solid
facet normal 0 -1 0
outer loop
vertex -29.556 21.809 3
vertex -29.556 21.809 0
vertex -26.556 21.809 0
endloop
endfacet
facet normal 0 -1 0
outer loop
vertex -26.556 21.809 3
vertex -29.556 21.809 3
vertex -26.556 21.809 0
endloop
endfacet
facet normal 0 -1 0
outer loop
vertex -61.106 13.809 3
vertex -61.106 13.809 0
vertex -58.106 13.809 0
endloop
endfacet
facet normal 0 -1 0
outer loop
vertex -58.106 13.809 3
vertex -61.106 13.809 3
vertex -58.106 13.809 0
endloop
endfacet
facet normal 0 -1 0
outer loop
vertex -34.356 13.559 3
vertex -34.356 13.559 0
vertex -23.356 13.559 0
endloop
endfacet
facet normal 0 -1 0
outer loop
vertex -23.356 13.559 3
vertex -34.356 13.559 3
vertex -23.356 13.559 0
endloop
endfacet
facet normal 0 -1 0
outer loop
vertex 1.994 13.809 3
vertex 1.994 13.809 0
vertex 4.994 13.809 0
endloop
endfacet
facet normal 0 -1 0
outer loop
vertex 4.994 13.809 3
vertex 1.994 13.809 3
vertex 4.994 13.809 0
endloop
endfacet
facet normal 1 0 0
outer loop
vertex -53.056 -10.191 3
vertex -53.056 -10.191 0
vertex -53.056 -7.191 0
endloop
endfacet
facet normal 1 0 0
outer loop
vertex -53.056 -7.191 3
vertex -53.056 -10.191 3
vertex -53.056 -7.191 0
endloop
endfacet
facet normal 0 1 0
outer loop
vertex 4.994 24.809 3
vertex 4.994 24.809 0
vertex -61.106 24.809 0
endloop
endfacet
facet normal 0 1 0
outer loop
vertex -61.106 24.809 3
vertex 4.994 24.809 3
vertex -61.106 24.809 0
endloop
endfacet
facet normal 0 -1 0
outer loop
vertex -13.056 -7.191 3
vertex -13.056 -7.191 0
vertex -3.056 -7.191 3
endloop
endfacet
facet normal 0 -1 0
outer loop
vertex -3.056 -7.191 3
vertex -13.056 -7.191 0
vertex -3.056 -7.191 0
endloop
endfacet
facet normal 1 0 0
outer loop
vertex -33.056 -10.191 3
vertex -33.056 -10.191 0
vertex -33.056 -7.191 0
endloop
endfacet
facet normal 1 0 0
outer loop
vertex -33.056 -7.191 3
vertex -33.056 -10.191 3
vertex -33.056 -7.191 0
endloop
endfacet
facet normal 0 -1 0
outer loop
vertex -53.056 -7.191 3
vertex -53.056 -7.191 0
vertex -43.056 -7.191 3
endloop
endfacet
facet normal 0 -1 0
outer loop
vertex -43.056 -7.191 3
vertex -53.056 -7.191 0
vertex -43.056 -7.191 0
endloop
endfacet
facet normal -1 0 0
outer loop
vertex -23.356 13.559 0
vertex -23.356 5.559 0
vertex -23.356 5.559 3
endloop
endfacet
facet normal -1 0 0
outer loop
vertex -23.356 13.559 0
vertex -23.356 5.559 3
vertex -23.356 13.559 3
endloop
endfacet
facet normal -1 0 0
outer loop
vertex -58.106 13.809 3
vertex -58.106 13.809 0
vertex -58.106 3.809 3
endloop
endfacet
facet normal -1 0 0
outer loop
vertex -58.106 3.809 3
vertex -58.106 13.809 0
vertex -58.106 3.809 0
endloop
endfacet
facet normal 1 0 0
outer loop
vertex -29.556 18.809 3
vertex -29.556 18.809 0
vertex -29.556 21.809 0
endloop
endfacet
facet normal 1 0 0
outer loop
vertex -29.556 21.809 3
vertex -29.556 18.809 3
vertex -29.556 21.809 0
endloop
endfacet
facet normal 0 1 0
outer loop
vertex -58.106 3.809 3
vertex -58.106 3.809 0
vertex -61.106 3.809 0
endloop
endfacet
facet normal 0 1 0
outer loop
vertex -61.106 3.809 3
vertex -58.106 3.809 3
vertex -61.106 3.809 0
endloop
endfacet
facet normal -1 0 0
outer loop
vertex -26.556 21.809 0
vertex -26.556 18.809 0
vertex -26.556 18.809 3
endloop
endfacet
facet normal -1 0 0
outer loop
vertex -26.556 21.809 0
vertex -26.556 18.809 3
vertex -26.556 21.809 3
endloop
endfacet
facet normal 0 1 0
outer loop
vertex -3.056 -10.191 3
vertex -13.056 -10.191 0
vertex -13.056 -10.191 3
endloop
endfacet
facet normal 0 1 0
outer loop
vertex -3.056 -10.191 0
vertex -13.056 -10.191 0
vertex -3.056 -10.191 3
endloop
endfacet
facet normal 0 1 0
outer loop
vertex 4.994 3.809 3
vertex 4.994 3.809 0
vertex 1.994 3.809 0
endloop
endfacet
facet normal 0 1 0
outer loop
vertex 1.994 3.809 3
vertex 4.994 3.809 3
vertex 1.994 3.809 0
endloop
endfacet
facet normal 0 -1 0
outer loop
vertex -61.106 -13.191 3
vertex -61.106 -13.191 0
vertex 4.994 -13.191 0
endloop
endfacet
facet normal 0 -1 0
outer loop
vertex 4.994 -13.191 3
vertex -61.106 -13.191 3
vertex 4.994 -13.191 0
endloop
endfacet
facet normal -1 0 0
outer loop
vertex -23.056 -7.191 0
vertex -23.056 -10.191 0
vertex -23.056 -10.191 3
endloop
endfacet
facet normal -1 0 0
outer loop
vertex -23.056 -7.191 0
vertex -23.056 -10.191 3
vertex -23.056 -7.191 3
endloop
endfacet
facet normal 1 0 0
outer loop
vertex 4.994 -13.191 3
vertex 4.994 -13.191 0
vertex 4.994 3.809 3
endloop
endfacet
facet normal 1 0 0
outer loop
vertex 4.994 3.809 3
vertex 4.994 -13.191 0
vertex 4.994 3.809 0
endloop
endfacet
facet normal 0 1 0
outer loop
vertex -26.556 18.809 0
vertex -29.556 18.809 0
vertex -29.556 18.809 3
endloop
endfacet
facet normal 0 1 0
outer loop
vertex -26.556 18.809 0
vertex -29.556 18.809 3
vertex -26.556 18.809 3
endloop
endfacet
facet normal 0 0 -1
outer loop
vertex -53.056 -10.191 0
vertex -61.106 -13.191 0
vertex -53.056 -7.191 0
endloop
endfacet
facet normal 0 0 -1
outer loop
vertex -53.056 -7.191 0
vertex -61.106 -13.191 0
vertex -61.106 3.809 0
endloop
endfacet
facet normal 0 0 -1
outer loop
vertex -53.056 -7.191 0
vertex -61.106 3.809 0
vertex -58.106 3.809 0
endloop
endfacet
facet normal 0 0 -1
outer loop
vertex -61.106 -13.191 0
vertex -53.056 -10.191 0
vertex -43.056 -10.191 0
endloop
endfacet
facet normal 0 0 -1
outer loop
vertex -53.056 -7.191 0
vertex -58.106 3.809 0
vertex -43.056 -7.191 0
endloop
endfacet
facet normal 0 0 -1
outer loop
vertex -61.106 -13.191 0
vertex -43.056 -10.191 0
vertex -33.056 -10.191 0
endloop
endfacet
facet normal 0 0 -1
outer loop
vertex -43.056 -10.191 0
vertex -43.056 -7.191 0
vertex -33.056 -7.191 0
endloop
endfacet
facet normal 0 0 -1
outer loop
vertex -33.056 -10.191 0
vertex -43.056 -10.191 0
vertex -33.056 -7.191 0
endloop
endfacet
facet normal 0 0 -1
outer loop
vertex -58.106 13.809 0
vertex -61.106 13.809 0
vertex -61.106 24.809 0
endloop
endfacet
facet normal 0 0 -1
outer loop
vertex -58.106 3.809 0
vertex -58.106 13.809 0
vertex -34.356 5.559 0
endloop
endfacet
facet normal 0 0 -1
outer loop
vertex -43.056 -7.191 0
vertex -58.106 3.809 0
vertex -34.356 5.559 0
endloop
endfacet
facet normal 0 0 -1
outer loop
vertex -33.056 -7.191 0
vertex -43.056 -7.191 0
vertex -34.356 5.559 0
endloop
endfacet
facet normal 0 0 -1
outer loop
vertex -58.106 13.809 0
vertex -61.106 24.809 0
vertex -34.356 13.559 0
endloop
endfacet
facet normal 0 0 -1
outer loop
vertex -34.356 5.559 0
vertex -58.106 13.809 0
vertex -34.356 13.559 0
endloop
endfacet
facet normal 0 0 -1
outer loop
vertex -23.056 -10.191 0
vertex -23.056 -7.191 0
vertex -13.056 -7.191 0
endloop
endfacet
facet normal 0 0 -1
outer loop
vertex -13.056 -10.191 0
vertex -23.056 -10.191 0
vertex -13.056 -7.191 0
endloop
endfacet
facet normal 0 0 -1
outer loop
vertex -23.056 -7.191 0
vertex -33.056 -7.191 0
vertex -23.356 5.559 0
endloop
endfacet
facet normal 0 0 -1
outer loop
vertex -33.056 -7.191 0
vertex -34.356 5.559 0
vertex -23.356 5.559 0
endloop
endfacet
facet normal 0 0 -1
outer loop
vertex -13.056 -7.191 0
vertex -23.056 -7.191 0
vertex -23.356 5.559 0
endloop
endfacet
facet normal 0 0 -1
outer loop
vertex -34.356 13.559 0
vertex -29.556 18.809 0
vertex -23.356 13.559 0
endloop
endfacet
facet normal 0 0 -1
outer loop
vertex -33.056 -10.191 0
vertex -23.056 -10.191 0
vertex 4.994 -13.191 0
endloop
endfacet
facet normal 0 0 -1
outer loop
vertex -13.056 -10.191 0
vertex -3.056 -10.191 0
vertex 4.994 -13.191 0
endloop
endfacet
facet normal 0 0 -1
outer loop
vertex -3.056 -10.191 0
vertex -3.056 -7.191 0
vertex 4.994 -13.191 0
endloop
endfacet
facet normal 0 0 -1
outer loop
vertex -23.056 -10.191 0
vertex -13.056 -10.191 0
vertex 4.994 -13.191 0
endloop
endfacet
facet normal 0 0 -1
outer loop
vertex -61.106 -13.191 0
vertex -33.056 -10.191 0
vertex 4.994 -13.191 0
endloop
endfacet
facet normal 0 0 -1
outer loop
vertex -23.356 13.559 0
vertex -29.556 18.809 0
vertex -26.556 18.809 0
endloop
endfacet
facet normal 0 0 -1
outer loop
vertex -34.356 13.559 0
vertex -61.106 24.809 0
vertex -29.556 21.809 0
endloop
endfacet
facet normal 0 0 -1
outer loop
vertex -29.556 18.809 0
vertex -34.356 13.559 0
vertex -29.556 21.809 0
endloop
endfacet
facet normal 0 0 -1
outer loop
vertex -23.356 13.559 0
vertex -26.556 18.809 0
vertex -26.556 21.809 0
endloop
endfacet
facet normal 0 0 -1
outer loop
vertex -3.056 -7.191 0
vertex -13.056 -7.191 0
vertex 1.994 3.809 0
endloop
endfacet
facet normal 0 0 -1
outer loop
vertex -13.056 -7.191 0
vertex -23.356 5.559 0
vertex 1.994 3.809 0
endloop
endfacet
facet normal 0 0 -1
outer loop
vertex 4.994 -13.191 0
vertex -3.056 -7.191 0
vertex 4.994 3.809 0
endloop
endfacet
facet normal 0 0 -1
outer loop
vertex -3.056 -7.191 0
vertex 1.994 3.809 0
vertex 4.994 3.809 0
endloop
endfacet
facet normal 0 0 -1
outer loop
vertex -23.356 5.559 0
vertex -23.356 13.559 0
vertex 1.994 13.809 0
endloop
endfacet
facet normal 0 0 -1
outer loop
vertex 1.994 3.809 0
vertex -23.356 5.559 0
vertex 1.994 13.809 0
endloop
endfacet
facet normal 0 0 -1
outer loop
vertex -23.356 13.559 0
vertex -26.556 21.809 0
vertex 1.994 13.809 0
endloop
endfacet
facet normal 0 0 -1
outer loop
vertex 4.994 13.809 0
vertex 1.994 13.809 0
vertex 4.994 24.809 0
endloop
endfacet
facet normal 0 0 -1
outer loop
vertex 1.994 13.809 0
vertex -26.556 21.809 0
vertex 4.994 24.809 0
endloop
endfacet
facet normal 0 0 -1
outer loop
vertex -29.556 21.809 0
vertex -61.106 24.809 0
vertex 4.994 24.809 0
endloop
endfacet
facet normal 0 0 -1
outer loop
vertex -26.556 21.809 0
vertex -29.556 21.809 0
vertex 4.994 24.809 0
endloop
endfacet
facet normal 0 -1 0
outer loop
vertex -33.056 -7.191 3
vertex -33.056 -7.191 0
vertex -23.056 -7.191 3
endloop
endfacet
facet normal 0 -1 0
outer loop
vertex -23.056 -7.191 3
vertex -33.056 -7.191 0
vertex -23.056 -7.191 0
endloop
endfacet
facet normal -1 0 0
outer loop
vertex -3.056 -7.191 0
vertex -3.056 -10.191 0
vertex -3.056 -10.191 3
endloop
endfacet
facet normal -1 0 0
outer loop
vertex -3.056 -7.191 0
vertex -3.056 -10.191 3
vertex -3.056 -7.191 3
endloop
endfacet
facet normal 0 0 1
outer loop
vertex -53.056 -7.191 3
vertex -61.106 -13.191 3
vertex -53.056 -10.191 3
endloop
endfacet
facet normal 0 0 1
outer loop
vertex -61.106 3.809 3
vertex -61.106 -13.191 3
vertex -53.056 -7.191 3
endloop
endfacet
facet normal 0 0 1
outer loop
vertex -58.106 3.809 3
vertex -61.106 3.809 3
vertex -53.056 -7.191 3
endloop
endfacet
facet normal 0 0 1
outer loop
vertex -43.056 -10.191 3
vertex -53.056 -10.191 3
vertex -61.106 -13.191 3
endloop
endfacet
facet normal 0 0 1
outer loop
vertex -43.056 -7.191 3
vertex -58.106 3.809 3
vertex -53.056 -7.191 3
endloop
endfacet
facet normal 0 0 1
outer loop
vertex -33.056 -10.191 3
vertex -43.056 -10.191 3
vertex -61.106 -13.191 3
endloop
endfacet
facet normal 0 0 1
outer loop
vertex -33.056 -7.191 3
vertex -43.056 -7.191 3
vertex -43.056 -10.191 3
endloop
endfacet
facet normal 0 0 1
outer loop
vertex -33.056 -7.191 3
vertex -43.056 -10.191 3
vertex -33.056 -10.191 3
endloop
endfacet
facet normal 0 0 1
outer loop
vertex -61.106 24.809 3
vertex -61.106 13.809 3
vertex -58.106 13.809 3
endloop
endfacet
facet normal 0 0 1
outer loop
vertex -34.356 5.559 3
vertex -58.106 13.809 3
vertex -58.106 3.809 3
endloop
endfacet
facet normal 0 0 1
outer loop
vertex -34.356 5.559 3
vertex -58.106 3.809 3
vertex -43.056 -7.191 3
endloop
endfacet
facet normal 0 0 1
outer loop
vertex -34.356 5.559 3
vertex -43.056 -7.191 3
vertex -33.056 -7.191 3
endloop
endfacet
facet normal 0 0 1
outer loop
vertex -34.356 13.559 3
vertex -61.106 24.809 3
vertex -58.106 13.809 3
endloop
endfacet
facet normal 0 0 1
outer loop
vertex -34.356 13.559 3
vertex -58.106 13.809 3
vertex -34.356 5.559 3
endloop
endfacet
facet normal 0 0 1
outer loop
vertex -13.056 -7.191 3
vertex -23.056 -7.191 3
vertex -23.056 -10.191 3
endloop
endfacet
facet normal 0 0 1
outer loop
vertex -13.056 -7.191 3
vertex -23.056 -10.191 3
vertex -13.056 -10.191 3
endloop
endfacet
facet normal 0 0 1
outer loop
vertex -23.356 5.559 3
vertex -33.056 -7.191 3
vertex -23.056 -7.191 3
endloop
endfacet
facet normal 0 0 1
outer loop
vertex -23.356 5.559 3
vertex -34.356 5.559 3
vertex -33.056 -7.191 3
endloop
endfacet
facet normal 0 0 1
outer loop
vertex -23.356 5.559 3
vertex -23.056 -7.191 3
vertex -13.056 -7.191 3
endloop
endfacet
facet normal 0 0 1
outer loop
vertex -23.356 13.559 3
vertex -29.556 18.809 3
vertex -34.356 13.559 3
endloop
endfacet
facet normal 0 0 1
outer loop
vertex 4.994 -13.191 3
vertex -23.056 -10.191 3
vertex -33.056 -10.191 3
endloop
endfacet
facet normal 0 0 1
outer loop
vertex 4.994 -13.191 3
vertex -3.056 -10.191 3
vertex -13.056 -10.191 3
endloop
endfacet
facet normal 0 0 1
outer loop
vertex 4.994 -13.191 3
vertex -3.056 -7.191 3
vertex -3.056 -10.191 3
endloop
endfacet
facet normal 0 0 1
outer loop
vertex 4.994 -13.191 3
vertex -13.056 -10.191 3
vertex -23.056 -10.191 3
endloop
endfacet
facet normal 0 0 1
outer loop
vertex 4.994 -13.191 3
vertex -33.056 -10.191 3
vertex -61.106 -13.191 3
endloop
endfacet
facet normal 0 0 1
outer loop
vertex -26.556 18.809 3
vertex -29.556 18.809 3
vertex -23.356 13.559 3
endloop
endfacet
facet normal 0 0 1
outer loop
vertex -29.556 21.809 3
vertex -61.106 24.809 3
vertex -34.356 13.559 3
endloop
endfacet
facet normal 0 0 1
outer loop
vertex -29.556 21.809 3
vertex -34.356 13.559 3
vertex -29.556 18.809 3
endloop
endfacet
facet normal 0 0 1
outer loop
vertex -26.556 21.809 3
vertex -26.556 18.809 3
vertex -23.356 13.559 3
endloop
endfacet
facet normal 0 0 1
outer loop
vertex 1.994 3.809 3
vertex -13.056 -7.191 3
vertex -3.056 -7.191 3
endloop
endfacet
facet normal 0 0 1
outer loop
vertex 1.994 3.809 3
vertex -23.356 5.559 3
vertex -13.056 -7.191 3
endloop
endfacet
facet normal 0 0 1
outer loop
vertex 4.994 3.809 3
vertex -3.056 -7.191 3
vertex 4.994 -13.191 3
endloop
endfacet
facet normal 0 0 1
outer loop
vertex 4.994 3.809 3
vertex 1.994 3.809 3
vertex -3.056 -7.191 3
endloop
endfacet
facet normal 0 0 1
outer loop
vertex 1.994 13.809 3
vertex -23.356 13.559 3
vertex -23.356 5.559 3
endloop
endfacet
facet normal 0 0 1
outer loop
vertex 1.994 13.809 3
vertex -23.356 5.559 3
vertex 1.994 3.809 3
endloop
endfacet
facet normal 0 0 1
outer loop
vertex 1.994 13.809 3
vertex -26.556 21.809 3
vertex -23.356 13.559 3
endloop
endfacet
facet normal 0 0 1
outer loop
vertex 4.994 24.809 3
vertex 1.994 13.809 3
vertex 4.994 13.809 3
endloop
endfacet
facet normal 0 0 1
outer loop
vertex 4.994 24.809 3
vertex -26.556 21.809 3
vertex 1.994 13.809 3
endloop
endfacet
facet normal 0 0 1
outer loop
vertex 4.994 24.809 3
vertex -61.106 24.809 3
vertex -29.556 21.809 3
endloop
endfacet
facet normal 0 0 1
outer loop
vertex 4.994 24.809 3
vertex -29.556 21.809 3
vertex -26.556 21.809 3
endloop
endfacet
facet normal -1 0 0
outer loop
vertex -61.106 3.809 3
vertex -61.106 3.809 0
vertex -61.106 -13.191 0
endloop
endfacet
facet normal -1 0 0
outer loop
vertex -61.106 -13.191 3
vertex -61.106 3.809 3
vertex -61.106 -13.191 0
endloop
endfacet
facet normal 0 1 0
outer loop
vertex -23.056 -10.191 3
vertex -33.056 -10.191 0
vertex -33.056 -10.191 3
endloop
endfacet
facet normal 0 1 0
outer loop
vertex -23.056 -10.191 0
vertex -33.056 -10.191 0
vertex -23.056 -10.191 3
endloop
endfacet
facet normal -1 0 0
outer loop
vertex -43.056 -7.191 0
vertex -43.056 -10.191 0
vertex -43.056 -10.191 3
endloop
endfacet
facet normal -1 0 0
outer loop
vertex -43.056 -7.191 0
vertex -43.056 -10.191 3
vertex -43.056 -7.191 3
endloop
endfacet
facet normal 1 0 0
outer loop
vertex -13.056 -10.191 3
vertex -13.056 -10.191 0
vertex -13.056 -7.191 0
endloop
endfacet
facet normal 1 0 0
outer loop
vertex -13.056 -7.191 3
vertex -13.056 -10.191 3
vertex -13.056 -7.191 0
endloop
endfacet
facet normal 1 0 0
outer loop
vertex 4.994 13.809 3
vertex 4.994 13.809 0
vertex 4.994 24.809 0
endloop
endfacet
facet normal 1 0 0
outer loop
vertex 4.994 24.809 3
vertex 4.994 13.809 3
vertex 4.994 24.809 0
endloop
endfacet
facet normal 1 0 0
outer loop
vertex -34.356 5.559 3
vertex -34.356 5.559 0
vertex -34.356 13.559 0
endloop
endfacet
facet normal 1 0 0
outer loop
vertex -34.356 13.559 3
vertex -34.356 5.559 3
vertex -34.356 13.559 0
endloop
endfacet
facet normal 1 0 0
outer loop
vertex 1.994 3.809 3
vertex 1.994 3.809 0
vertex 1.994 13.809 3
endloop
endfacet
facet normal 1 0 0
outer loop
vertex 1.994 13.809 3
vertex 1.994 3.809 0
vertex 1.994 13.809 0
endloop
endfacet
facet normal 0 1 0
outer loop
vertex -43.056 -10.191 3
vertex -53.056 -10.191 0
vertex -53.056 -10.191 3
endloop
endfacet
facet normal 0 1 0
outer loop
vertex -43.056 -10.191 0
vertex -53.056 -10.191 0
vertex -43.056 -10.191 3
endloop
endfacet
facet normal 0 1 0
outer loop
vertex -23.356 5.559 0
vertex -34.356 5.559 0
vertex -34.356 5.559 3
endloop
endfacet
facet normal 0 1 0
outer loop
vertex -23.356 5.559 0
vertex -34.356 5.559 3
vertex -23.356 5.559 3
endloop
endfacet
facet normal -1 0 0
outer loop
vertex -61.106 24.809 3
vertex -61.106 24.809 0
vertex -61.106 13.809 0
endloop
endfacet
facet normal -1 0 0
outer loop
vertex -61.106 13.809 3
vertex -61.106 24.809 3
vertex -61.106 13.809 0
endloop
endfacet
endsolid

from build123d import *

# Parameters (mm, degrees)
SKETCH1_W           = 10
SKETCH1_H           = 3
SKETCH1_W_2         = 11
SKETCH1_H_2         = 8
SKETCH1_W_3         = 3
BOSS_EXTRUDE1_DEPTH = 3


with BuildPart() as part:
    # Sketch1 → Boss-Extrude1 (new body)
    with BuildSketch(Plane.XY):
        Polygon((4.993890114, 24.809336695), (-61.106109886, 24.809336695), (-61.106109886, 13.809336695), (-58.106109886, 13.809336695), (-58.106109886, 3.809336695), (-61.106109886, 3.809336695), (-61.106109886, -13.190663305), (4.993890114, -13.190663305), (4.993890114, 3.809336695), (1.993890114, 3.809336695), (1.993890114, 13.809336695), (4.993890114, 13.809336695), align=None)
        with Locations((-28.056109886, -8.690663305)):
            Rectangle(SKETCH1_W, SKETCH1_H, mode=Mode.SUBTRACT)
        with Locations((-28.856109886, 9.559336695)):
            Rectangle(SKETCH1_W_2, SKETCH1_H_2, mode=Mode.SUBTRACT)
        with Locations((-28.056109886, 20.309336695)):
            Rectangle(SKETCH1_W_3, SKETCH1_H, mode=Mode.SUBTRACT)
        with Locations((-8.056109886, -8.690663305)):
            Rectangle(SKETCH1_W, SKETCH1_H, mode=Mode.SUBTRACT)
        with Locations((-48.056109886, -8.690663305)):
            Rectangle(SKETCH1_W, SKETCH1_H, mode=Mode.SUBTRACT)
    extrude(amount=BOSS_EXTRUDE1_DEPTH)


solid = part.part
